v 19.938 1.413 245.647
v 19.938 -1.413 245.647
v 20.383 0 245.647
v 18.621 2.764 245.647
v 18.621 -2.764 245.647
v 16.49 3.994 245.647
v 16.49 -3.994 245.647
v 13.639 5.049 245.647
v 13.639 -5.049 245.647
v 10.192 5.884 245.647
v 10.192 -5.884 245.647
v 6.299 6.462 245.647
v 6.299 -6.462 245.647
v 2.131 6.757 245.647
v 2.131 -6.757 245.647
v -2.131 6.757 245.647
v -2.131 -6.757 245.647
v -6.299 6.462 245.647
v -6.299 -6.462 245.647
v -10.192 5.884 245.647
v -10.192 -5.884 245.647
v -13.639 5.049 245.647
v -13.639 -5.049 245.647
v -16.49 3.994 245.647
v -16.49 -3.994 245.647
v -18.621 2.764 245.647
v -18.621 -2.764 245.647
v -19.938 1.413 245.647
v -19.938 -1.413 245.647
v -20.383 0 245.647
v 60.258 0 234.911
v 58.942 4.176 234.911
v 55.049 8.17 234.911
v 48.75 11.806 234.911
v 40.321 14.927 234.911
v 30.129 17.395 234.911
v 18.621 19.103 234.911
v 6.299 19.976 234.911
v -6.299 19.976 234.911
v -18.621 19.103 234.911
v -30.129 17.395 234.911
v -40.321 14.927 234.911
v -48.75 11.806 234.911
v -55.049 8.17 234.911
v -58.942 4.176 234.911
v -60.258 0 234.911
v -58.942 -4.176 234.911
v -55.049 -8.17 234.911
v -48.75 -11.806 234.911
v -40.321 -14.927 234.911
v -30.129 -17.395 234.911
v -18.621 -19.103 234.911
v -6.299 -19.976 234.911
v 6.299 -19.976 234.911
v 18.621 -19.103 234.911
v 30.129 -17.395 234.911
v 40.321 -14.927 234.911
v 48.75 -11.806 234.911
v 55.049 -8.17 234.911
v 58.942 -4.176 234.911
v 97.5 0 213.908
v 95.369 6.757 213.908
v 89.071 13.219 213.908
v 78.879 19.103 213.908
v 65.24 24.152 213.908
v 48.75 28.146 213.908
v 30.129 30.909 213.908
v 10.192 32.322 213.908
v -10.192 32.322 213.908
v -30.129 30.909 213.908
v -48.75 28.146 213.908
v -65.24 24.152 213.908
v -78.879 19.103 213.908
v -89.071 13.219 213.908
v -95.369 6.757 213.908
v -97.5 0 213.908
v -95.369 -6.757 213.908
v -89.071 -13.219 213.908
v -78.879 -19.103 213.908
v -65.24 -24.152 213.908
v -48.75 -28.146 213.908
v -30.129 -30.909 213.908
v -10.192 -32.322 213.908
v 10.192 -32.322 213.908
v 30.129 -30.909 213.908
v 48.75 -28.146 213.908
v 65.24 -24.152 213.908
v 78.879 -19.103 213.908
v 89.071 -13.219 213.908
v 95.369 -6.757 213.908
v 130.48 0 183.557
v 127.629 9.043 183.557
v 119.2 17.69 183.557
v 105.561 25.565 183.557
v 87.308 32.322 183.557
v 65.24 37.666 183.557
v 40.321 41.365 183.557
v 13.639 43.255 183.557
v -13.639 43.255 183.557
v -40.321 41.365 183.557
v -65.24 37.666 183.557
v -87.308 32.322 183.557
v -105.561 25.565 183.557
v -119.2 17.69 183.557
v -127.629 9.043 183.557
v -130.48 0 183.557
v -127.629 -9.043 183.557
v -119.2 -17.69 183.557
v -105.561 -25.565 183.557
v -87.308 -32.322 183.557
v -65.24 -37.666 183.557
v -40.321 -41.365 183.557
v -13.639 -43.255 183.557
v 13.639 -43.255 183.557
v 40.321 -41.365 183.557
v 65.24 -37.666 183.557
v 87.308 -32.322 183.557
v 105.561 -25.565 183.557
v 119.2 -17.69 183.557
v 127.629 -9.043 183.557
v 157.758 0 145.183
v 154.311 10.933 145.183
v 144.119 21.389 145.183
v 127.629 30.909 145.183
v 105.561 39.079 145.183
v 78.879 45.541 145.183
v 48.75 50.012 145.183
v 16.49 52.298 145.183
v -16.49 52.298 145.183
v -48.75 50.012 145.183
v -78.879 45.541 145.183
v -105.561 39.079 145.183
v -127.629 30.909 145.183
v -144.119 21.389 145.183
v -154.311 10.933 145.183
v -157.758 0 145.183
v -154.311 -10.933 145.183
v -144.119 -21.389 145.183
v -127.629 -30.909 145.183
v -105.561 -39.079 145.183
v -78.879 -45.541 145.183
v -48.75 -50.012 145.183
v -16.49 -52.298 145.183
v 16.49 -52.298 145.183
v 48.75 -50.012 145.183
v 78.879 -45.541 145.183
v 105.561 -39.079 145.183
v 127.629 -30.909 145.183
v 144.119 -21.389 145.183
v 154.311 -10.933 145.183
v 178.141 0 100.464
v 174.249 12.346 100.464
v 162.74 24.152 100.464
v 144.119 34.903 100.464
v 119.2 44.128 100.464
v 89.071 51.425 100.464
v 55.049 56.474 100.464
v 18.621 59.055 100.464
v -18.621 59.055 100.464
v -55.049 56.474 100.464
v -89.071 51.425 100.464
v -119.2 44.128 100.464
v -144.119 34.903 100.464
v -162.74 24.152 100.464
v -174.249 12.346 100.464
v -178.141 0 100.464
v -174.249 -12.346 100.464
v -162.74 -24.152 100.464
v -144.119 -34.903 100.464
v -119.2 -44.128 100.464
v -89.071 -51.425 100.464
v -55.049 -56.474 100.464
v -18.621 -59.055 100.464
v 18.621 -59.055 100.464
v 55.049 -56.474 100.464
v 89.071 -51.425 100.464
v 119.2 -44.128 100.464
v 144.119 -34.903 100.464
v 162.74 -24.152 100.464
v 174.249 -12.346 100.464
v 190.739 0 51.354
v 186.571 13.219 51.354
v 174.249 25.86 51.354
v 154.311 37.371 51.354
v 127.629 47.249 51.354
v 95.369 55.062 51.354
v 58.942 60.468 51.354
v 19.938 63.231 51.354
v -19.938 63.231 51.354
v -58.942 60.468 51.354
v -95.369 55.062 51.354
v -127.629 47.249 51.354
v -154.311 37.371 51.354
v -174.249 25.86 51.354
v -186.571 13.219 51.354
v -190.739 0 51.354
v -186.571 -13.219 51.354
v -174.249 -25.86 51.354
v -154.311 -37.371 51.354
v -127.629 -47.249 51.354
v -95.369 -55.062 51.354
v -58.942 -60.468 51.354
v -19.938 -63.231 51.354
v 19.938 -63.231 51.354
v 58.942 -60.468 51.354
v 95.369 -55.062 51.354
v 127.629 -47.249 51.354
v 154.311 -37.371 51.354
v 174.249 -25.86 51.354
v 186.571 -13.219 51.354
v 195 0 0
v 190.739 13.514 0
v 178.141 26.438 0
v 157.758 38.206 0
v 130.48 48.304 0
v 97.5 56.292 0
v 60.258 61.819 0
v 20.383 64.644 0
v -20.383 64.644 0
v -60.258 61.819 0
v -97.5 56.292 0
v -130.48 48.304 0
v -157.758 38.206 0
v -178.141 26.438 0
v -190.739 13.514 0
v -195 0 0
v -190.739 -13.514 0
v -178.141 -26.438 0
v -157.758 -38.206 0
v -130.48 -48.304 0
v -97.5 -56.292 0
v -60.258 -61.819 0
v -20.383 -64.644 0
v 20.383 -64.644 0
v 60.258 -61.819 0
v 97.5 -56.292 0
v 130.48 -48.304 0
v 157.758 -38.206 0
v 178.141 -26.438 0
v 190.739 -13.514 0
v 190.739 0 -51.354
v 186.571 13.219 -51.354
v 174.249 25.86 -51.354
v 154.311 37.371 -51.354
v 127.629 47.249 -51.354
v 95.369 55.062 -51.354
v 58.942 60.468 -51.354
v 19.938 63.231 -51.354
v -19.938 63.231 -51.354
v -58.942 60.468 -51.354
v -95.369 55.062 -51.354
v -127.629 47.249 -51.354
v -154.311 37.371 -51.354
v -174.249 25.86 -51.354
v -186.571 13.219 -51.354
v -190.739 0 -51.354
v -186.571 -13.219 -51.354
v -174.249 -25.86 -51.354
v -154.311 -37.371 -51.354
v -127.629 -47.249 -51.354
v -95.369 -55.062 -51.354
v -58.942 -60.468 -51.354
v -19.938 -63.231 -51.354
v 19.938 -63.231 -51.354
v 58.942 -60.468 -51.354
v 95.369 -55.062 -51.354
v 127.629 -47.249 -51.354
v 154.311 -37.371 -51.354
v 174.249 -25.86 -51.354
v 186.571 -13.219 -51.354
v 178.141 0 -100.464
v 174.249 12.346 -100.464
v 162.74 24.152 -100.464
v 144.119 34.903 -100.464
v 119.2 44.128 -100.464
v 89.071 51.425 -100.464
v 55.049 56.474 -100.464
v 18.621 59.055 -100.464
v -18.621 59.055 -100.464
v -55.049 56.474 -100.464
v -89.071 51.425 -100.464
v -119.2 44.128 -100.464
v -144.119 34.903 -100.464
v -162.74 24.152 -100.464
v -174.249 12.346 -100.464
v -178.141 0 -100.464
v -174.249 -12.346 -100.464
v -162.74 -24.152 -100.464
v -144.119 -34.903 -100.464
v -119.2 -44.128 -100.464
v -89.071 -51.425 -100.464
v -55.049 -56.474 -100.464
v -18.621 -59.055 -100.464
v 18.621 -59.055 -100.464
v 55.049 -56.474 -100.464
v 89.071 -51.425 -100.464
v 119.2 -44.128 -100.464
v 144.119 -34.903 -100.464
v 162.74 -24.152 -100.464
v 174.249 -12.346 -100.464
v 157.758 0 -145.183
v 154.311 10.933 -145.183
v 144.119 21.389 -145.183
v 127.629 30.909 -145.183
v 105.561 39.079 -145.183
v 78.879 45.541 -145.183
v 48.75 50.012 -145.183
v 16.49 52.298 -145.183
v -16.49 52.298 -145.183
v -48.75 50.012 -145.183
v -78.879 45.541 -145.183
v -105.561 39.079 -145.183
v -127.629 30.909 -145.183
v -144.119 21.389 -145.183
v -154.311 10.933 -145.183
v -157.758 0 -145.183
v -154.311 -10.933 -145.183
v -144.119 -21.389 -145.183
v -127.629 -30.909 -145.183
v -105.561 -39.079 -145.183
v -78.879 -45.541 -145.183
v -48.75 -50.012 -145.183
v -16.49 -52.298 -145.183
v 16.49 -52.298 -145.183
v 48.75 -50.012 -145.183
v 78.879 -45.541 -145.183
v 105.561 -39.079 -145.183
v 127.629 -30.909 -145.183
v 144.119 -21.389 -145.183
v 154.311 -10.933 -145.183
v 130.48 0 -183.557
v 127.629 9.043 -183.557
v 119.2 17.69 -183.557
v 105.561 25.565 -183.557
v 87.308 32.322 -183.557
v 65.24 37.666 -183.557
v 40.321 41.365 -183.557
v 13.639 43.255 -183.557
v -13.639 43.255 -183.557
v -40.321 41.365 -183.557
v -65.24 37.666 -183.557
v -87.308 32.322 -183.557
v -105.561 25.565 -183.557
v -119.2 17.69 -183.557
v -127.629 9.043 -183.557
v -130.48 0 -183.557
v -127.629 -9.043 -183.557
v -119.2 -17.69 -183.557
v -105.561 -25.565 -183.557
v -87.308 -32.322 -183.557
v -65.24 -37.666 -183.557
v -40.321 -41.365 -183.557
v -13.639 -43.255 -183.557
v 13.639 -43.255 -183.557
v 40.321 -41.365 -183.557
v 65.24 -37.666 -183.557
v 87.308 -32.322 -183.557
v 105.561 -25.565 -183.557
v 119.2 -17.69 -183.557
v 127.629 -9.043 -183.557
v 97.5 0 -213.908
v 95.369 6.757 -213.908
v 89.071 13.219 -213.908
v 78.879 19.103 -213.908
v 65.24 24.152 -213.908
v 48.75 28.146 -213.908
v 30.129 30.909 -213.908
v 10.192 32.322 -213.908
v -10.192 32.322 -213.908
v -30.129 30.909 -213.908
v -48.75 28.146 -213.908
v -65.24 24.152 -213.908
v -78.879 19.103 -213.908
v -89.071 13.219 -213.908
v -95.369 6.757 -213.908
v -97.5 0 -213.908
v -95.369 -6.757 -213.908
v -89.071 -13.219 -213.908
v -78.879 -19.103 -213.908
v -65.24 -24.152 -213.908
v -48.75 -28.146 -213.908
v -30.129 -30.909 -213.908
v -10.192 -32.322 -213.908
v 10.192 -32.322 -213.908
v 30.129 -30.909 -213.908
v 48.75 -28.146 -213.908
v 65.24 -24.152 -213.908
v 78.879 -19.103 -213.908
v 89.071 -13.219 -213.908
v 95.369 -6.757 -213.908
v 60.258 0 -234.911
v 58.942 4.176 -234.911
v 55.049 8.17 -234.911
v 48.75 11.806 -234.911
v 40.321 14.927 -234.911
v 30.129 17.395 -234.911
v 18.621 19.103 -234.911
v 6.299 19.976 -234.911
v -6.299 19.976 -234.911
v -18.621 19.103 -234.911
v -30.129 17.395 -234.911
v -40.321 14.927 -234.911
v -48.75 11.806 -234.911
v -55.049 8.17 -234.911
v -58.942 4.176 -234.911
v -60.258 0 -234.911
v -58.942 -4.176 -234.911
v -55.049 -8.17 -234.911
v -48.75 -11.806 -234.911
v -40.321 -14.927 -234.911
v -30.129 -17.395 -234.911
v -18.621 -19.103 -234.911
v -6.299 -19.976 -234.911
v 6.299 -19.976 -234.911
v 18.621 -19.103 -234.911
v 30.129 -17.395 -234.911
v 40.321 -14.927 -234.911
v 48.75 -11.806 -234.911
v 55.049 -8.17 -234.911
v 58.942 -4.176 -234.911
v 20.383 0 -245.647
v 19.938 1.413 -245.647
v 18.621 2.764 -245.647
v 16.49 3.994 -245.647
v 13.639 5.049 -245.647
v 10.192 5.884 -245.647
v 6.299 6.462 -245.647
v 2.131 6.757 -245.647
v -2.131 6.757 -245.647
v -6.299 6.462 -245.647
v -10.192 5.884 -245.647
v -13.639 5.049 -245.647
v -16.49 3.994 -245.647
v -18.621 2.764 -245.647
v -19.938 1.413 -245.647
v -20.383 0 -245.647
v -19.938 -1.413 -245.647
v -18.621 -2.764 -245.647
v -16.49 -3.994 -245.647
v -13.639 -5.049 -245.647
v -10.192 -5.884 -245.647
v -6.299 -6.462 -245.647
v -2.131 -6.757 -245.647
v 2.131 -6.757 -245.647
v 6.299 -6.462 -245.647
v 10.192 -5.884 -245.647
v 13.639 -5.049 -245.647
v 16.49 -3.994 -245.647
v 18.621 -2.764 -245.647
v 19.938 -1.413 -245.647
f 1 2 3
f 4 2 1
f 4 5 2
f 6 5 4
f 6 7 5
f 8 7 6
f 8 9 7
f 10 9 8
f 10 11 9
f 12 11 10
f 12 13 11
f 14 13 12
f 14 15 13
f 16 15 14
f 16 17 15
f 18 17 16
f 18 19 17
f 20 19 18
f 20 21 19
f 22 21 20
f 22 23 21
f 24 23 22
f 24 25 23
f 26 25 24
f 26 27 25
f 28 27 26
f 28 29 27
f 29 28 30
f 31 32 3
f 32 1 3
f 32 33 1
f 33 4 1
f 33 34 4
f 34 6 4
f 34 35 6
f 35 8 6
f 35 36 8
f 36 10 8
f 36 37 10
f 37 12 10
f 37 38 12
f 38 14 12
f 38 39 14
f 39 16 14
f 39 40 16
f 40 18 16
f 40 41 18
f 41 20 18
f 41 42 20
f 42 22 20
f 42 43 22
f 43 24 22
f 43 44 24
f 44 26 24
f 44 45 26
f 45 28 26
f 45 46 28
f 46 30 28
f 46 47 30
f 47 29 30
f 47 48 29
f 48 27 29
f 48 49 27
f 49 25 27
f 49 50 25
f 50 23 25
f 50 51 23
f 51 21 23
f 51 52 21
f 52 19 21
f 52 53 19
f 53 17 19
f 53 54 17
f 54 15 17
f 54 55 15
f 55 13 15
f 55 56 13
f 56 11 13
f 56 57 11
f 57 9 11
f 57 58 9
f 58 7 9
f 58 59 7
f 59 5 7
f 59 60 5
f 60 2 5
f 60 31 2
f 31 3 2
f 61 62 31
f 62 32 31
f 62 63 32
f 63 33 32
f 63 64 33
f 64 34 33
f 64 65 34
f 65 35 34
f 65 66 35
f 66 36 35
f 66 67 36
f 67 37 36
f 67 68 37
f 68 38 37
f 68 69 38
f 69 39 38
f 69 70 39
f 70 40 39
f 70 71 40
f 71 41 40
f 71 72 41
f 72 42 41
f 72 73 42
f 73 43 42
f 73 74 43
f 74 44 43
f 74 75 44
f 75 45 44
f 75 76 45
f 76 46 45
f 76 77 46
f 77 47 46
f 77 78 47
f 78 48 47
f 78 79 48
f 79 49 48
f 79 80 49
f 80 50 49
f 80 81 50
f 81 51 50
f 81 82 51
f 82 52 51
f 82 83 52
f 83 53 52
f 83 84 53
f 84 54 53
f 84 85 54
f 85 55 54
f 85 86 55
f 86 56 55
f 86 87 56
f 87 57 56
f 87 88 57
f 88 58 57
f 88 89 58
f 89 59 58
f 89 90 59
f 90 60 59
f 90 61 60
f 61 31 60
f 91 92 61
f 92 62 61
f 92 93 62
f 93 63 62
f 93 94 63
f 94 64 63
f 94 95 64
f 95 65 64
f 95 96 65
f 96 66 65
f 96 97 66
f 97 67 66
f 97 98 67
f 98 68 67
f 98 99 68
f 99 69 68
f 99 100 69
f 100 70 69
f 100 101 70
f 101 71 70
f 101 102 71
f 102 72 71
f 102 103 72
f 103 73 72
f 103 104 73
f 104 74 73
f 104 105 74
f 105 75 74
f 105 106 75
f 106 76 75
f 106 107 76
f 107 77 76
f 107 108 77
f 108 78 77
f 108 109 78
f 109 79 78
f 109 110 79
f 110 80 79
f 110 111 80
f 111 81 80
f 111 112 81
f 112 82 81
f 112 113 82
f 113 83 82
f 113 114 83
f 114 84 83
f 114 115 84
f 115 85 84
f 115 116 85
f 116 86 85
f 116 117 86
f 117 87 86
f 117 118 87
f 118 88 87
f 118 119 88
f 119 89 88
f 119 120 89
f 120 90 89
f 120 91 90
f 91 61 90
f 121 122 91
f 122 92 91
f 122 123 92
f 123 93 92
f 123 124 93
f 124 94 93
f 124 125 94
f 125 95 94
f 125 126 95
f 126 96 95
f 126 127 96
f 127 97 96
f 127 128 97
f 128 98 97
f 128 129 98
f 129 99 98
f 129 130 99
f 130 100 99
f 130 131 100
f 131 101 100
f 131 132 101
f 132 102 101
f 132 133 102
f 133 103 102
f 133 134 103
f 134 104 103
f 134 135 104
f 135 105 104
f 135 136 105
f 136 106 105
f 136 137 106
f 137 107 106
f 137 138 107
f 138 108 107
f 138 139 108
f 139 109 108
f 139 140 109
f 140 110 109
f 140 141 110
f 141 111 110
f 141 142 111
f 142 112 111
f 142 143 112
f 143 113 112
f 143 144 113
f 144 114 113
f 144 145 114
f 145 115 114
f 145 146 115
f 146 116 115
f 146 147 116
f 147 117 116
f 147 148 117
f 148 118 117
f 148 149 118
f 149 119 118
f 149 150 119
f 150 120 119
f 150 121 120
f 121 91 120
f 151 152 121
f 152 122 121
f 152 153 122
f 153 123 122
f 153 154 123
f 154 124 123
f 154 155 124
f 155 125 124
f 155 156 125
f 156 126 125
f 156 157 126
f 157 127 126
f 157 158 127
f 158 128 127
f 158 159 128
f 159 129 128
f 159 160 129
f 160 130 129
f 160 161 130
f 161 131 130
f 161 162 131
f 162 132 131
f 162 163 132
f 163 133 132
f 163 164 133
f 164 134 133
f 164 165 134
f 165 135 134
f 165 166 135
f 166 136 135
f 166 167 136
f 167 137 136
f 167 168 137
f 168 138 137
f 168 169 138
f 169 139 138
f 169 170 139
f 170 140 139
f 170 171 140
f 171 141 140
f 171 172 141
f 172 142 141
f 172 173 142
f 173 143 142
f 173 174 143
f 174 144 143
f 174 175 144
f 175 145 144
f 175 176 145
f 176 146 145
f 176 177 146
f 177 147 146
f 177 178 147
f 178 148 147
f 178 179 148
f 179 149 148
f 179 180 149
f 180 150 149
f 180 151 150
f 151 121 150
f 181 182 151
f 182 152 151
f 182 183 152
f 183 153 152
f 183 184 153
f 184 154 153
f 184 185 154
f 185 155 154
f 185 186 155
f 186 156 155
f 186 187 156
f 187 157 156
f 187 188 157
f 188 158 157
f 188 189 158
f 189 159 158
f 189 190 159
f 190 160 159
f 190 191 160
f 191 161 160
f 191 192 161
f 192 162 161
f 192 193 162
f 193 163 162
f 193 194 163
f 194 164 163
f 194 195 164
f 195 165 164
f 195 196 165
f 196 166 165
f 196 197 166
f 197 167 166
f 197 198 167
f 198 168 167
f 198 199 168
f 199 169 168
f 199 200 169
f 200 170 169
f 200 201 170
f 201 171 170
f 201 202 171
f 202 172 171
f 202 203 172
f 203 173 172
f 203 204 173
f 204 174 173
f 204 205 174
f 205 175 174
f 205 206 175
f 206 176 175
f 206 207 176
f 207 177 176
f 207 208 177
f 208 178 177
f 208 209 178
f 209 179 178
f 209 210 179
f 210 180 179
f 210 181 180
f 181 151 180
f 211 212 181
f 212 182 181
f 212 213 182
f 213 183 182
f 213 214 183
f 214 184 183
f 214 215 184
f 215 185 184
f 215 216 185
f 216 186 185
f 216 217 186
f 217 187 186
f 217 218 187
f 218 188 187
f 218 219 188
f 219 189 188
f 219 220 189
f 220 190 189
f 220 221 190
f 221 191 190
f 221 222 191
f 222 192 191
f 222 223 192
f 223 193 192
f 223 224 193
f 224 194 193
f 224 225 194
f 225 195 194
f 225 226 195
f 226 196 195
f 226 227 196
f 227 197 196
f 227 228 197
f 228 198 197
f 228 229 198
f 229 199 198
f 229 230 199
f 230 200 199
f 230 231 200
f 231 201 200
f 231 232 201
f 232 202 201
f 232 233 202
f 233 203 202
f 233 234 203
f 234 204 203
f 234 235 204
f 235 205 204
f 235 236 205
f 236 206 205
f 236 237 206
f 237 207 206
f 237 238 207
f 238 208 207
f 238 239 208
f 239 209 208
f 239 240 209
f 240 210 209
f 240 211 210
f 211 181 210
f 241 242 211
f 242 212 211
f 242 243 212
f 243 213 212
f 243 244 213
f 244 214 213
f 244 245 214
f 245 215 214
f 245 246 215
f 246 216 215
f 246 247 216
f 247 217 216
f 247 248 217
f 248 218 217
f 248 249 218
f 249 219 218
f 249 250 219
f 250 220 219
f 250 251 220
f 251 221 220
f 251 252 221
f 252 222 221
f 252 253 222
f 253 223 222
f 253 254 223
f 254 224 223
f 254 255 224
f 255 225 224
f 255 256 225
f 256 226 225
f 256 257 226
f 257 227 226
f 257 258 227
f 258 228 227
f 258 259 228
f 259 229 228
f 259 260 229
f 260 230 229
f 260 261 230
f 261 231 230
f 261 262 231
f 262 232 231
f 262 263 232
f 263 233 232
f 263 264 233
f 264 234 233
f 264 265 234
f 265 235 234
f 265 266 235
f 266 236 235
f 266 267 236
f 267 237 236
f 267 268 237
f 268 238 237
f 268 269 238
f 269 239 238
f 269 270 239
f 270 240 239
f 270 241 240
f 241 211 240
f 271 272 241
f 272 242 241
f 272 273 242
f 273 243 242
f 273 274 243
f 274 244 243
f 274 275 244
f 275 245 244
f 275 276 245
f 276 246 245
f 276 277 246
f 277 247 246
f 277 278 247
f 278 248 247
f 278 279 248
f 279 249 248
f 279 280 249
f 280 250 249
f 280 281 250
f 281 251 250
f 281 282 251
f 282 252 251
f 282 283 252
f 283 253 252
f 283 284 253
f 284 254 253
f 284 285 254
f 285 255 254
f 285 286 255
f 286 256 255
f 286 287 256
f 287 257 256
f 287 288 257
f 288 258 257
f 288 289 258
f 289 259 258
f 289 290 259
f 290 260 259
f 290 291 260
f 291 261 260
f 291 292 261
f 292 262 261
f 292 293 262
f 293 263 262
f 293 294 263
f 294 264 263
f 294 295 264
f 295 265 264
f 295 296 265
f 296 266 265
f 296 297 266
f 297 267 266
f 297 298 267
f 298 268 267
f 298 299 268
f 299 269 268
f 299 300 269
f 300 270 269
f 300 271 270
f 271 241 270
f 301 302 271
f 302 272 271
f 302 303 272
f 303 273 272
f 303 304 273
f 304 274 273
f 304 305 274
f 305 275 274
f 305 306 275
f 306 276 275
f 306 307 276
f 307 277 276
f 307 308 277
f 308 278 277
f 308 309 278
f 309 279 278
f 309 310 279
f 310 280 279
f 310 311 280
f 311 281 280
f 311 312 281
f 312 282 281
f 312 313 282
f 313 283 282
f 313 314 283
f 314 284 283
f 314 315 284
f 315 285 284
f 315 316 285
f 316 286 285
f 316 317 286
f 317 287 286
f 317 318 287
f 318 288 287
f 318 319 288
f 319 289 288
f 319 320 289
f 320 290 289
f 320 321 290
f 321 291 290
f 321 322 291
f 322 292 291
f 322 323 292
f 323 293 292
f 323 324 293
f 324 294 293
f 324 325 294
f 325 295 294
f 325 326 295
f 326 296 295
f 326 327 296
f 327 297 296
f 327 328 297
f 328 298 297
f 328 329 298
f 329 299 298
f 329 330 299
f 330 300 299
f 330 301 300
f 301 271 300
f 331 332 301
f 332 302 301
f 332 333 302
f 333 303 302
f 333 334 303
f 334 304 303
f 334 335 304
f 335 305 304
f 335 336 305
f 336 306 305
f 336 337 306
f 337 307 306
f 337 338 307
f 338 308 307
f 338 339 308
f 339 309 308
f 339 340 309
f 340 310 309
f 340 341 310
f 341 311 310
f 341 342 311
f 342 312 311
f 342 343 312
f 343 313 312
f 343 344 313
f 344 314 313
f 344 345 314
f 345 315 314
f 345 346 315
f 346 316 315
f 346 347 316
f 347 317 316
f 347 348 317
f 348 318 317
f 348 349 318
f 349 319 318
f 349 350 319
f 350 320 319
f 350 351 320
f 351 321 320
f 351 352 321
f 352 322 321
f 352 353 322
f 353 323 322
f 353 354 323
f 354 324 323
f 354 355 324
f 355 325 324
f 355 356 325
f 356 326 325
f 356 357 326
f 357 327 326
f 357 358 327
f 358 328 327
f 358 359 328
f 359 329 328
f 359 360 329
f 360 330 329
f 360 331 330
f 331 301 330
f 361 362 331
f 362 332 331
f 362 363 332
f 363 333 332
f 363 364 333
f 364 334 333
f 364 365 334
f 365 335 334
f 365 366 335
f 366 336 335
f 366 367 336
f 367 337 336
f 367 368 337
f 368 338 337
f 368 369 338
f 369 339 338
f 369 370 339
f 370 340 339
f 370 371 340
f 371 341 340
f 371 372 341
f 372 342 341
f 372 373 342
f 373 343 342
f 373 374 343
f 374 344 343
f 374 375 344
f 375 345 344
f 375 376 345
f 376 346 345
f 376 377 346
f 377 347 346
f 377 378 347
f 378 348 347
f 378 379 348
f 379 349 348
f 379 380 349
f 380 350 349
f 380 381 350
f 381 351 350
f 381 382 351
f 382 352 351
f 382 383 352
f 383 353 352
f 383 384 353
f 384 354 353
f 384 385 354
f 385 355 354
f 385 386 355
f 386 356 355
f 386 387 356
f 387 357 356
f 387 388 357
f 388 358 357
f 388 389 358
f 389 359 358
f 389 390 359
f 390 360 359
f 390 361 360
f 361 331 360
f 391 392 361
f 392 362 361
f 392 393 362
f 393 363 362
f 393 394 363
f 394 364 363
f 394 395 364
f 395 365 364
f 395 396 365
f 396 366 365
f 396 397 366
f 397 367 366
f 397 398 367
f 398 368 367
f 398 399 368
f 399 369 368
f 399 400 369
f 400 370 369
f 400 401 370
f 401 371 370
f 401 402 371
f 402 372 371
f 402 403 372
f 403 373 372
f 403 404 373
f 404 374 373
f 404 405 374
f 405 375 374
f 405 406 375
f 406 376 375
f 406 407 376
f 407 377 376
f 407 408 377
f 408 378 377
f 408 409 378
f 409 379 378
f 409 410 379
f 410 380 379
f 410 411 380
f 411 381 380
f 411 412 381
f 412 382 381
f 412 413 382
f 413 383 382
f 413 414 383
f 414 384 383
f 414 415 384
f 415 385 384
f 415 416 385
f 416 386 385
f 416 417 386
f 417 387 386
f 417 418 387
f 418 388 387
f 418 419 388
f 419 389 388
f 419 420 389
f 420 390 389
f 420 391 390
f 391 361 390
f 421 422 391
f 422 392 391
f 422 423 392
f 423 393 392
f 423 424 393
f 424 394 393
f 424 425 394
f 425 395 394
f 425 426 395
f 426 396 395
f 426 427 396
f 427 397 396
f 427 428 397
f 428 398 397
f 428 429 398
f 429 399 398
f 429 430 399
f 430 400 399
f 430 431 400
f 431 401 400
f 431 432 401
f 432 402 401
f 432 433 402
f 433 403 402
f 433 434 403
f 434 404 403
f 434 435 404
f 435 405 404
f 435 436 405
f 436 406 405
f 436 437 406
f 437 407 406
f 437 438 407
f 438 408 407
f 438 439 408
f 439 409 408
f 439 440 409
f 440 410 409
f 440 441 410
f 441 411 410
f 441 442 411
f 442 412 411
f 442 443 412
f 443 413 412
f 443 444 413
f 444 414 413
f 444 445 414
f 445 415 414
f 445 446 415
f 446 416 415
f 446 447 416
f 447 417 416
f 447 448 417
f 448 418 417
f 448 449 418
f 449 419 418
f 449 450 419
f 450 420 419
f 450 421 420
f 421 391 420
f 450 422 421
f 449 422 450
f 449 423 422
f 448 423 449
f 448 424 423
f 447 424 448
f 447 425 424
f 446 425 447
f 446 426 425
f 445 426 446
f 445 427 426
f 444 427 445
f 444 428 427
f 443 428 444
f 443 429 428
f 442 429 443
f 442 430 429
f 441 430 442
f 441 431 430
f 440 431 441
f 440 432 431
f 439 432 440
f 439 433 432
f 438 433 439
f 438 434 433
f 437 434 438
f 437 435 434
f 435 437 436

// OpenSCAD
// Generated by SolidPython 1.0.1 on 2020-07-29 00:46:51


scale(v = [15, 5, 19]) {
	sphere(r = 13);
}
/***********************************************
*********      SolidPython code:      **********
************************************************
 
# import packages: SolidPython
from solid import *
from solid.utils import *
from itertools import chain, combinations, permutations


class Resize:

    def __init__(self, scad_file):
        self.scad_file = scad_file
        #self.scad_file = import_scad(scad_file)
        # cone/cylinder param:
        self.r1 = 0
        self.r2 = 0
        self.h = 0
        # rectangular prism param:
        self.w = 0
        self.l = 0
        # ellipse param:
        self.r = 0

    # import OpenScad code (file name corresponds to shape)


    # classify shape + parameters
    def assign(self, param1, param2, param3):
        if self.scad_file == 'cone.scad':
            self.r1 = param1
            self.r2 = param2
            self.h = param3
        elif self.scad_file == 'cylinder.scad':
            self.r1 = param1
            self.r2 = param2
            self.h = param3
        elif self.scad_file == 'rectangularPrism.scad':
            self.h = param1
            self.l = param2
            self.w = param3
        else:
            self.r = param1
            self.h = param2

    # resize parameters
    def iterate(self):
        x = range(3, 20, 2)
        i = 1
        if self.scad_file == 'cone.scad':
            tempList = list(permutations(x, 2))
            for temp in tempList:
                param1 = temp[0]
                param2 = temp[1]
                filepath = 'produced_scad_files/' + 'cone' + str(param1) + '_' + str(param2) + '_' + '.scad'
                scad_render_to_file(cylinder(h=param1, r1=param2, r2=0), filepath)

        elif self.scad_file == 'cylinder.scad':
            tempList = list(permutations(x, 3))
            for temp in tempList:
                param1 = temp[0]
                param2 = temp[1]
                filepath = 'produced_scad_files/' + 'cylinder' + str(param1) + '_' + str(param2) + '_' + '.scad'
                scad_render_to_file(cylinder(h=param1, r1=param2, r2=param2), filepath)

        elif self.scad_file == 'rectangularPrism.scad':
            tempList = list(permutations(x, 3))
            for temp in tempList:
                param1 = temp[0]
                param2 = temp[1]
                param3 = temp[2]
                filepath = 'produced_scad_files/' + 'rectangularPrism' + str(param1) + '_' + str(param2) + '_' + str(
                    param3) + '.scad'
                scad_render_to_file(cube(size=(param1, param2, param3)), filepath)

        elif self.scad_file == 'ellipse.scad':
            tempList = list(permutations(x, 4))
            for temp in tempList:
                param1 = temp[0]
                param2 = temp[1]
                param3 = temp[2]
                param4 = temp[3]
                filepath = 'produced_scad_files/' + 'ellipse' + str(param1) + '_' + str(param2) + '_' + str(param3) + '_' + str(param4) + '.scad'
                scad_render_to_file(scale([param1, param2, param3])(sphere(r=param4)), filepath)

    def render_to_scadfile(self):
        scad_render_to_file(scad, 'example.scad') 
 
************************************************/
